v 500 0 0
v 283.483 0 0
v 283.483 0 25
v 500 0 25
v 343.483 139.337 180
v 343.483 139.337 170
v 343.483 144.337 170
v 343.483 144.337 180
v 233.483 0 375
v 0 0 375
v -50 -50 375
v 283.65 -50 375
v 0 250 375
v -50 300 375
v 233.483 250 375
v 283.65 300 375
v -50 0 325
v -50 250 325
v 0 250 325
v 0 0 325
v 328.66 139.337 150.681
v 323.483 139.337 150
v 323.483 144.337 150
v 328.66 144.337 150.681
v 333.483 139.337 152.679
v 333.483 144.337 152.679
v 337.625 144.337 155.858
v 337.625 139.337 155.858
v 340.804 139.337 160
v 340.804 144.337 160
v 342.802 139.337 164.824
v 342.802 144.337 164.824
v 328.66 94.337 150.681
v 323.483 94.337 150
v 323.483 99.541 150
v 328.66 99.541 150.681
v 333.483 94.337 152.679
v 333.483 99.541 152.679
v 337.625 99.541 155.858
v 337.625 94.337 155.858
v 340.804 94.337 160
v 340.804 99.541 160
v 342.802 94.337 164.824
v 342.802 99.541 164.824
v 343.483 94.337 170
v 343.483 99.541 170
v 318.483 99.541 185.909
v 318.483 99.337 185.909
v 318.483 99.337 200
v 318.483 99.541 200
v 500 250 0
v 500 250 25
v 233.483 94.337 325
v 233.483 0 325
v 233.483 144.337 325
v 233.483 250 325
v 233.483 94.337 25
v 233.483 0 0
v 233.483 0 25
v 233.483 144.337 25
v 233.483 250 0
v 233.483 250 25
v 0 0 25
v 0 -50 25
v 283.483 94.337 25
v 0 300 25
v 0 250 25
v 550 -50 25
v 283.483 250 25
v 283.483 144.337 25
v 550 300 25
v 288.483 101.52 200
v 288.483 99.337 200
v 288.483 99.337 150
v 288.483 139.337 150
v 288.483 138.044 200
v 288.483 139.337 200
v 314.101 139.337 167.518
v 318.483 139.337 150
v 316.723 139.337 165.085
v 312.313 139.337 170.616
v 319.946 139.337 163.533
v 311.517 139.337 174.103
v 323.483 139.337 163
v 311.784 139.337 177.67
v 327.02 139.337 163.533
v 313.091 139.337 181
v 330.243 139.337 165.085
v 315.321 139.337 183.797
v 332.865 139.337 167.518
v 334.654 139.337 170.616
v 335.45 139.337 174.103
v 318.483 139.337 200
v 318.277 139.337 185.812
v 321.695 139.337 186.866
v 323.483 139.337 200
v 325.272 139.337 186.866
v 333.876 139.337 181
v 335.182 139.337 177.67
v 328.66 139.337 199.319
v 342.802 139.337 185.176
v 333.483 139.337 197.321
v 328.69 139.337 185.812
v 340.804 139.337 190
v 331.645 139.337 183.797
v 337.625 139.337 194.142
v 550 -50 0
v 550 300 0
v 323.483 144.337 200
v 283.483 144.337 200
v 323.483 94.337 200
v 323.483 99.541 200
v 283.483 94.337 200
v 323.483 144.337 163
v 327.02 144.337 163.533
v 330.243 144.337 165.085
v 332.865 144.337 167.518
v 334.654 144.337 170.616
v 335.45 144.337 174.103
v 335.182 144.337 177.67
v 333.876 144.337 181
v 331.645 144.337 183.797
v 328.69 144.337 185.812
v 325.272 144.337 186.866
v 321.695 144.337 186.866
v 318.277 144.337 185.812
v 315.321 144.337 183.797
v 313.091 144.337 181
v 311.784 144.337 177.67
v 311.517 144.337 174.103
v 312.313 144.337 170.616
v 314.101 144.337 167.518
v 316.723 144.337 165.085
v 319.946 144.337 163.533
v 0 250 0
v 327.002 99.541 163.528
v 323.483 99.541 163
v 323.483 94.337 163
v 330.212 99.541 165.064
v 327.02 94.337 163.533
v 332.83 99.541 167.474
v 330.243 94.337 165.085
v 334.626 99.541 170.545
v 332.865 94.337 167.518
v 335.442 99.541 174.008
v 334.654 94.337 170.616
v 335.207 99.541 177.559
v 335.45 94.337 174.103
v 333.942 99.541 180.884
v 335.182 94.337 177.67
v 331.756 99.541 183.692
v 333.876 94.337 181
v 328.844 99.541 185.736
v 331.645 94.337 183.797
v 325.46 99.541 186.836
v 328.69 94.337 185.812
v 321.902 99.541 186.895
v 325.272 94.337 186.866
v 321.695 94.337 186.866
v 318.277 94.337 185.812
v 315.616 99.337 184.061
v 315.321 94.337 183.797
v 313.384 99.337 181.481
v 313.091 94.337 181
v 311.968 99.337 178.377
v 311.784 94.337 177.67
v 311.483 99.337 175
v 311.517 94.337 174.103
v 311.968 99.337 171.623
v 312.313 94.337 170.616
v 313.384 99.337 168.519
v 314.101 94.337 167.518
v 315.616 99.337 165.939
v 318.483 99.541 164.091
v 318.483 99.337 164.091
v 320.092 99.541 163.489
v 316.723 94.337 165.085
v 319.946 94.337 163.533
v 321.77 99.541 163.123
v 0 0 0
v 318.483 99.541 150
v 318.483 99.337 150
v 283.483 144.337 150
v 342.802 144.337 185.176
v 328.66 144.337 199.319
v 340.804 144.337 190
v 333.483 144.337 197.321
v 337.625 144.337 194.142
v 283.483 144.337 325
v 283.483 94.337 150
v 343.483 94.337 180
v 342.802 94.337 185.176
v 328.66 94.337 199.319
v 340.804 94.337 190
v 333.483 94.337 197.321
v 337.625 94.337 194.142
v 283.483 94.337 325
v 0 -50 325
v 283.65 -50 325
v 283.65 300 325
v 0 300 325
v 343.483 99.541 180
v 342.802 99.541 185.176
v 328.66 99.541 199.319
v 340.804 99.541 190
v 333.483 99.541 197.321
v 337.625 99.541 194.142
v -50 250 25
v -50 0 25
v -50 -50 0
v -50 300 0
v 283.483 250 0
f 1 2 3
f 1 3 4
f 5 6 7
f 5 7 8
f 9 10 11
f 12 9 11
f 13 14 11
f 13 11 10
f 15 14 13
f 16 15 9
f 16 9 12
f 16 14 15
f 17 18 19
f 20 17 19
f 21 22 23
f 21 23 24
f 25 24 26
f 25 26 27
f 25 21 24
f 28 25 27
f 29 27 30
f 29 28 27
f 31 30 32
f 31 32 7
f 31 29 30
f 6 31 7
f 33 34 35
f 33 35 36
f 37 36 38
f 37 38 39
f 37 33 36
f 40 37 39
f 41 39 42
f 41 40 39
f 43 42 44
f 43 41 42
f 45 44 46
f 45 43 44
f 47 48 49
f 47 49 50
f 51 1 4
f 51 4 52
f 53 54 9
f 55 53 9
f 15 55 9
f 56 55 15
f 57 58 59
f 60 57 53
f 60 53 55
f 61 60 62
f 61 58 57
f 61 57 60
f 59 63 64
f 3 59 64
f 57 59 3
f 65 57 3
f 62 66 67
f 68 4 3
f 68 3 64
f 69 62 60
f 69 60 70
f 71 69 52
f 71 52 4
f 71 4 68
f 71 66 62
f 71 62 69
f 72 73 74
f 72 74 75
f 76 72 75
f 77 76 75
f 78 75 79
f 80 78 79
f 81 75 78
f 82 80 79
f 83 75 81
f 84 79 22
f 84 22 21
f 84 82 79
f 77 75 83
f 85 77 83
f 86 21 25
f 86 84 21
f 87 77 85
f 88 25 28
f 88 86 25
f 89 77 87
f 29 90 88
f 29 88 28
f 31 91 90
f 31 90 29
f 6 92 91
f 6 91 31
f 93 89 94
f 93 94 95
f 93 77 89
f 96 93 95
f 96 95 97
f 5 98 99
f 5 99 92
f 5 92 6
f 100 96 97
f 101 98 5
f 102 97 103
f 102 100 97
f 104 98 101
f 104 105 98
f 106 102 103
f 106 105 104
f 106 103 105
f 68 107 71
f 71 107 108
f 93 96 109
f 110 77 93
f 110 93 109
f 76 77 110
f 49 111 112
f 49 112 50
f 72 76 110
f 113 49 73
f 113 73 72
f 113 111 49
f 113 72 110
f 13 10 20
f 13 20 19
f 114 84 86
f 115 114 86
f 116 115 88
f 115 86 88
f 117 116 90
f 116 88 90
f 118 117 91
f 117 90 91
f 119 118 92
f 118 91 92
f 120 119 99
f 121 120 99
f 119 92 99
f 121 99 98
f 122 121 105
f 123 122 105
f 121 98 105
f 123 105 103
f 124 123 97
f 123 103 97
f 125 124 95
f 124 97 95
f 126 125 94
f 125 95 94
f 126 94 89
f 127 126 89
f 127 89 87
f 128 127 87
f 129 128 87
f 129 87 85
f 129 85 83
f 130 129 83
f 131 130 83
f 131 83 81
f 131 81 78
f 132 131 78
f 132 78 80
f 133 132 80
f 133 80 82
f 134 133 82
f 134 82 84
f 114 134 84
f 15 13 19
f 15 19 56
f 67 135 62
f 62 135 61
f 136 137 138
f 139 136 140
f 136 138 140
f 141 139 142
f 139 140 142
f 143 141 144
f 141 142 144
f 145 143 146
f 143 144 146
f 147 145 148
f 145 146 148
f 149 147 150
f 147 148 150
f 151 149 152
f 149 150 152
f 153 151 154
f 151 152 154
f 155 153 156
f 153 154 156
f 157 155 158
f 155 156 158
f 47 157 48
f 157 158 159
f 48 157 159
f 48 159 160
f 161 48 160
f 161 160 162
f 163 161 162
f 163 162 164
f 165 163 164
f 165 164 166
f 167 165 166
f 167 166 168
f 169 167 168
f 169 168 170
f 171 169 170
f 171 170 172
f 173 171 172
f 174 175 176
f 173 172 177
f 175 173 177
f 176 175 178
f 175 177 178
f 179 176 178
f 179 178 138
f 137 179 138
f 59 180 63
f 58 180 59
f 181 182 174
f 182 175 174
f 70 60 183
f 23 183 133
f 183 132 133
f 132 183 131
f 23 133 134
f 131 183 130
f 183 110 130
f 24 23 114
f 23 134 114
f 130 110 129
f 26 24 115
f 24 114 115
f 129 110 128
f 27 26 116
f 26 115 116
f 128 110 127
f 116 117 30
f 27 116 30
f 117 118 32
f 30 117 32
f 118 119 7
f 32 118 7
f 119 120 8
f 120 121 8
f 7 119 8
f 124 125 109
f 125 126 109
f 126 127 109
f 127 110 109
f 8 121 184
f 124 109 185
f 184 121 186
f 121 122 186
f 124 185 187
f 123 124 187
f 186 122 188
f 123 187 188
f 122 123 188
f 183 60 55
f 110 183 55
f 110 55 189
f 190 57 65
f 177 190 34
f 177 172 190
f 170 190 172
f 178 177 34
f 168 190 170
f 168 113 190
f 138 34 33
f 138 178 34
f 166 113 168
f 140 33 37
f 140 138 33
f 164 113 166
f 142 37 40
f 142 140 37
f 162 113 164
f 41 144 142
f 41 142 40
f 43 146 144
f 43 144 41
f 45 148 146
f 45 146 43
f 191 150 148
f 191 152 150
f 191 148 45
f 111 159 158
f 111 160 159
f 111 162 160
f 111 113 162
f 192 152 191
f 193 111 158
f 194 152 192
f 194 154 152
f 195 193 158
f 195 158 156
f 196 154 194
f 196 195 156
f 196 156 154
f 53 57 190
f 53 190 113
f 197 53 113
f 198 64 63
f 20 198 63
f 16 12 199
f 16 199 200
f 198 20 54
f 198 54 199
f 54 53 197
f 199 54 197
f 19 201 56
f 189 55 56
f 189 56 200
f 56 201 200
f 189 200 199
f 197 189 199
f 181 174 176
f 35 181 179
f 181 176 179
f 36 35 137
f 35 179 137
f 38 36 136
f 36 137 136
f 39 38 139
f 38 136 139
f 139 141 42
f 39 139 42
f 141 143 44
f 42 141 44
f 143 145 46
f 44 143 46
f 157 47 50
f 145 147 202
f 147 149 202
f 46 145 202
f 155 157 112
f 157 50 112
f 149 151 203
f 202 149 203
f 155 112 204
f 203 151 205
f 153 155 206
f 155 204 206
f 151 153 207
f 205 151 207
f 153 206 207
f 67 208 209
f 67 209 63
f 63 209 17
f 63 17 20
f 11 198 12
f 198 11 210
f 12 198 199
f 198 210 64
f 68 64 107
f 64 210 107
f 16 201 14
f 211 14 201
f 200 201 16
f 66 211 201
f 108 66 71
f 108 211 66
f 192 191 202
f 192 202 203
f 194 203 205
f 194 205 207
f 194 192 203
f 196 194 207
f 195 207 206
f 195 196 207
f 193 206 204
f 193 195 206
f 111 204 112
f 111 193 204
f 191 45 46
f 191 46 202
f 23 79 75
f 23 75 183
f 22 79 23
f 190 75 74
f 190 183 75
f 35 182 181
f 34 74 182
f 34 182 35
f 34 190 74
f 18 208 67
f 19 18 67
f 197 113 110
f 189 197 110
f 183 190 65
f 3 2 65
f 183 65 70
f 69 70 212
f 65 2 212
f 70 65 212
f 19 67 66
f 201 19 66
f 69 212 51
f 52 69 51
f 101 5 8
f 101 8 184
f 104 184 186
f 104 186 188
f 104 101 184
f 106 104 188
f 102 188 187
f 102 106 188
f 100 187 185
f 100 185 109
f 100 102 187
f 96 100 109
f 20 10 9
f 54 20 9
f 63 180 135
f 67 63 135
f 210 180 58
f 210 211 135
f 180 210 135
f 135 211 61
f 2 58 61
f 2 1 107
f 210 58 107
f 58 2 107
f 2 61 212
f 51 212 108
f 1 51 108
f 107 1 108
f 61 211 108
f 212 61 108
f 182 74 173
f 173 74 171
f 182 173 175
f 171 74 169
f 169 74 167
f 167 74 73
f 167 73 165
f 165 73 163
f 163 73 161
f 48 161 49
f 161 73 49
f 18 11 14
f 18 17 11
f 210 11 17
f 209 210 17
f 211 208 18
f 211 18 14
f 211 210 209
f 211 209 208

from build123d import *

# Parameters (mm, degrees)
SKETCH1_W            = 600
SKETCH1_H            = 350
SKETCH1_W_2          = 500
SKETCH1_H_2          = 250
BOSS_EXTRUDE1_DEPTH  = 25
SKETCH2_W            = 50
SKETCH2_H            = 50
BOSS_EXTRUDE2_DEPTH  = 350
SKETCH6_W            = 50
SKETCH6_H            = 25
BOSS_EXTRUDE5_DEPTH  = 300
SKETCH7_W            = 50
SKETCH7_H            = 50
BOSS_EXTRUDE6_DEPTH  = 300
SKETCH8_W            = 50
SKETCH8_H            = 50
BOSS_EXTRUDE7_DEPTH  = 50
SKETCH9_W            = 333.649864746
SKETCH9_H            = 350
SKETCH9_W_2          = 233.483328298
SKETCH9_H_2          = 250
BOSS_EXTRUDE8_DEPTH  = 50
SKETCH10_W           = 50
SKETCH10_H           = 50
BOSS_EXTRUDE10_DEPTH = 10
BOSS_EXTRUDE13_DEPTH = 50
SKETCH15_W           = 30
SKETCH15_H           = 40
CUT_EXTRUDE1_DEPTH   = 50
SKETCH16_R           = 12
CUT_EXTRUDE2_DEPTH   = 50
SKETCH17_W           = 49.023713481
SKETCH17_H           = 36.523713481
CUT_EXTRUDE3_DEPTH   = 100
SKETCH18_W           = 57.595301864
SKETCH18_H           = 39.795828349
CUT_EXTRUDE4_DEPTH   = 100


with BuildPart() as part:
    # Sketch1 → Boss-Extrude1 (new body)
    with BuildSketch(Plane.XY):
        with Locations((250, 125)):
            Rectangle(SKETCH1_W, SKETCH1_H)
        with Locations((250, 125)):
            Rectangle(SKETCH1_W_2, SKETCH1_H_2, mode=Mode.SUBTRACT)
    extrude(amount=BOSS_EXTRUDE1_DEPTH)

    # Sketch2 → Boss-Extrude2 (add)
    with BuildSketch(Plane.XY.offset(25)):
        with Locations((-25, 275)):
            Rectangle(SKETCH2_W, SKETCH2_H)
        with Locations((-25, -25)):
            Rectangle(SKETCH2_W, SKETCH2_H)
    extrude(amount=BOSS_EXTRUDE2_DEPTH)

    # Sketch6 → Boss-Extrude5 (add)
    with BuildSketch(Plane.XZ.offset(-250)):
        with Locations((258.483328298, 12.5)):
            Rectangle(SKETCH6_W, SKETCH6_H)
    extrude(amount=BOSS_EXTRUDE5_DEPTH)

    # Sketch7 → Boss-Extrude6 (add)
    with BuildSketch(Plane.XY.offset(25)):
        with Locations((258.483328298, 119.33659126)):
            Rectangle(SKETCH7_W, SKETCH7_H)
    extrude(amount=BOSS_EXTRUDE6_DEPTH)

    # Sketch8 → Boss-Extrude7 (add)
    with BuildSketch(Plane.XY.offset(325)):
        with Locations((258.483328298, 119.33659126)):
            Rectangle(SKETCH8_W, SKETCH8_H)
    extrude(amount=BOSS_EXTRUDE7_DEPTH)

    # Sketch9 → Boss-Extrude8 (add)
    with BuildSketch(Plane.XY.offset(375)):
        with Locations((116.824932373, 125)):
            Rectangle(SKETCH9_W, SKETCH9_H)
        with Locations((116.741664149, 125)):
            Rectangle(SKETCH9_W_2, SKETCH9_H_2, mode=Mode.SUBTRACT)
    extrude(amount=-BOSS_EXTRUDE8_DEPTH)

    # Sketch10 → Boss-Extrude10 (add)
    with BuildSketch(Plane(origin=(283.483328298, 0, 0), x_dir=(0, 0, -1), z_dir=(1, 0, 0))):
        with Locations((-175, 119.33659126)):
            Rectangle(SKETCH10_W, SKETCH10_H)
    extrude(amount=BOSS_EXTRUDE10_DEPTH)

    # Sketch12 → Boss-Extrude13 (add)
    with BuildSketch(Plane.XZ.offset(-94.33659126)):
        with BuildLine():
            Line((293.483328298, 150), (323.483328298, 150))
            ThreePointArc((323.483328298, 150), (337.625463922, 155.857864376), (343.483328298, 170))
            Line((343.483328298, 170), (343.483328298, 180))
            ThreePointArc((343.483328298, 180), (337.625463922, 194.142135624), (323.483328298, 200))
            Line((323.483328298, 200), (293.483328298, 200))
            Line((293.483328298, 200), (293.483328298, 150))
        make_face()
    extrude(amount=-BOSS_EXTRUDE13_DEPTH)

    # Sketch15 → Cut-Extrude1 (cut)
    with BuildSketch(Plane.XY.offset(200)):
        with Locations((303.483328298, 119.33659126)):
            Rectangle(SKETCH15_W, SKETCH15_H)
    extrude(amount=-CUT_EXTRUDE1_DEPTH, mode=Mode.SUBTRACT)

    # Sketch16 → Cut-Extrude2 (cut)
    with BuildSketch(Plane.XZ.offset(-94.33659126)):
        with Locations(Location((323.483328298, 175, 0), (0, 0, 270))):
            Circle(SKETCH16_R)
    extrude(amount=-CUT_EXTRUDE2_DEPTH, mode=Mode.SUBTRACT)

    # Sketch17 → Cut-Extrude3 (cut)
    with BuildSketch(Plane(origin=(288.483328298, 0, 0), x_dir=(0, 0, -1), z_dir=(1, 0, 0))):
        with Locations((-175.48814326, 119.782326646)):
            Rectangle(SKETCH17_W, SKETCH17_H)
    extrude(amount=CUT_EXTRUDE3_DEPTH, mode=Mode.SUBTRACT)

    # Sketch18 → Cut-Extrude4 (cut)
    with BuildSketch(Plane.XY.offset(200)):
        with Locations((317.28097923, 119.438677086)):
            Rectangle(SKETCH18_W, SKETCH18_H)
    extrude(amount=-CUT_EXTRUDE4_DEPTH, mode=Mode.SUBTRACT)


solid = part.part
